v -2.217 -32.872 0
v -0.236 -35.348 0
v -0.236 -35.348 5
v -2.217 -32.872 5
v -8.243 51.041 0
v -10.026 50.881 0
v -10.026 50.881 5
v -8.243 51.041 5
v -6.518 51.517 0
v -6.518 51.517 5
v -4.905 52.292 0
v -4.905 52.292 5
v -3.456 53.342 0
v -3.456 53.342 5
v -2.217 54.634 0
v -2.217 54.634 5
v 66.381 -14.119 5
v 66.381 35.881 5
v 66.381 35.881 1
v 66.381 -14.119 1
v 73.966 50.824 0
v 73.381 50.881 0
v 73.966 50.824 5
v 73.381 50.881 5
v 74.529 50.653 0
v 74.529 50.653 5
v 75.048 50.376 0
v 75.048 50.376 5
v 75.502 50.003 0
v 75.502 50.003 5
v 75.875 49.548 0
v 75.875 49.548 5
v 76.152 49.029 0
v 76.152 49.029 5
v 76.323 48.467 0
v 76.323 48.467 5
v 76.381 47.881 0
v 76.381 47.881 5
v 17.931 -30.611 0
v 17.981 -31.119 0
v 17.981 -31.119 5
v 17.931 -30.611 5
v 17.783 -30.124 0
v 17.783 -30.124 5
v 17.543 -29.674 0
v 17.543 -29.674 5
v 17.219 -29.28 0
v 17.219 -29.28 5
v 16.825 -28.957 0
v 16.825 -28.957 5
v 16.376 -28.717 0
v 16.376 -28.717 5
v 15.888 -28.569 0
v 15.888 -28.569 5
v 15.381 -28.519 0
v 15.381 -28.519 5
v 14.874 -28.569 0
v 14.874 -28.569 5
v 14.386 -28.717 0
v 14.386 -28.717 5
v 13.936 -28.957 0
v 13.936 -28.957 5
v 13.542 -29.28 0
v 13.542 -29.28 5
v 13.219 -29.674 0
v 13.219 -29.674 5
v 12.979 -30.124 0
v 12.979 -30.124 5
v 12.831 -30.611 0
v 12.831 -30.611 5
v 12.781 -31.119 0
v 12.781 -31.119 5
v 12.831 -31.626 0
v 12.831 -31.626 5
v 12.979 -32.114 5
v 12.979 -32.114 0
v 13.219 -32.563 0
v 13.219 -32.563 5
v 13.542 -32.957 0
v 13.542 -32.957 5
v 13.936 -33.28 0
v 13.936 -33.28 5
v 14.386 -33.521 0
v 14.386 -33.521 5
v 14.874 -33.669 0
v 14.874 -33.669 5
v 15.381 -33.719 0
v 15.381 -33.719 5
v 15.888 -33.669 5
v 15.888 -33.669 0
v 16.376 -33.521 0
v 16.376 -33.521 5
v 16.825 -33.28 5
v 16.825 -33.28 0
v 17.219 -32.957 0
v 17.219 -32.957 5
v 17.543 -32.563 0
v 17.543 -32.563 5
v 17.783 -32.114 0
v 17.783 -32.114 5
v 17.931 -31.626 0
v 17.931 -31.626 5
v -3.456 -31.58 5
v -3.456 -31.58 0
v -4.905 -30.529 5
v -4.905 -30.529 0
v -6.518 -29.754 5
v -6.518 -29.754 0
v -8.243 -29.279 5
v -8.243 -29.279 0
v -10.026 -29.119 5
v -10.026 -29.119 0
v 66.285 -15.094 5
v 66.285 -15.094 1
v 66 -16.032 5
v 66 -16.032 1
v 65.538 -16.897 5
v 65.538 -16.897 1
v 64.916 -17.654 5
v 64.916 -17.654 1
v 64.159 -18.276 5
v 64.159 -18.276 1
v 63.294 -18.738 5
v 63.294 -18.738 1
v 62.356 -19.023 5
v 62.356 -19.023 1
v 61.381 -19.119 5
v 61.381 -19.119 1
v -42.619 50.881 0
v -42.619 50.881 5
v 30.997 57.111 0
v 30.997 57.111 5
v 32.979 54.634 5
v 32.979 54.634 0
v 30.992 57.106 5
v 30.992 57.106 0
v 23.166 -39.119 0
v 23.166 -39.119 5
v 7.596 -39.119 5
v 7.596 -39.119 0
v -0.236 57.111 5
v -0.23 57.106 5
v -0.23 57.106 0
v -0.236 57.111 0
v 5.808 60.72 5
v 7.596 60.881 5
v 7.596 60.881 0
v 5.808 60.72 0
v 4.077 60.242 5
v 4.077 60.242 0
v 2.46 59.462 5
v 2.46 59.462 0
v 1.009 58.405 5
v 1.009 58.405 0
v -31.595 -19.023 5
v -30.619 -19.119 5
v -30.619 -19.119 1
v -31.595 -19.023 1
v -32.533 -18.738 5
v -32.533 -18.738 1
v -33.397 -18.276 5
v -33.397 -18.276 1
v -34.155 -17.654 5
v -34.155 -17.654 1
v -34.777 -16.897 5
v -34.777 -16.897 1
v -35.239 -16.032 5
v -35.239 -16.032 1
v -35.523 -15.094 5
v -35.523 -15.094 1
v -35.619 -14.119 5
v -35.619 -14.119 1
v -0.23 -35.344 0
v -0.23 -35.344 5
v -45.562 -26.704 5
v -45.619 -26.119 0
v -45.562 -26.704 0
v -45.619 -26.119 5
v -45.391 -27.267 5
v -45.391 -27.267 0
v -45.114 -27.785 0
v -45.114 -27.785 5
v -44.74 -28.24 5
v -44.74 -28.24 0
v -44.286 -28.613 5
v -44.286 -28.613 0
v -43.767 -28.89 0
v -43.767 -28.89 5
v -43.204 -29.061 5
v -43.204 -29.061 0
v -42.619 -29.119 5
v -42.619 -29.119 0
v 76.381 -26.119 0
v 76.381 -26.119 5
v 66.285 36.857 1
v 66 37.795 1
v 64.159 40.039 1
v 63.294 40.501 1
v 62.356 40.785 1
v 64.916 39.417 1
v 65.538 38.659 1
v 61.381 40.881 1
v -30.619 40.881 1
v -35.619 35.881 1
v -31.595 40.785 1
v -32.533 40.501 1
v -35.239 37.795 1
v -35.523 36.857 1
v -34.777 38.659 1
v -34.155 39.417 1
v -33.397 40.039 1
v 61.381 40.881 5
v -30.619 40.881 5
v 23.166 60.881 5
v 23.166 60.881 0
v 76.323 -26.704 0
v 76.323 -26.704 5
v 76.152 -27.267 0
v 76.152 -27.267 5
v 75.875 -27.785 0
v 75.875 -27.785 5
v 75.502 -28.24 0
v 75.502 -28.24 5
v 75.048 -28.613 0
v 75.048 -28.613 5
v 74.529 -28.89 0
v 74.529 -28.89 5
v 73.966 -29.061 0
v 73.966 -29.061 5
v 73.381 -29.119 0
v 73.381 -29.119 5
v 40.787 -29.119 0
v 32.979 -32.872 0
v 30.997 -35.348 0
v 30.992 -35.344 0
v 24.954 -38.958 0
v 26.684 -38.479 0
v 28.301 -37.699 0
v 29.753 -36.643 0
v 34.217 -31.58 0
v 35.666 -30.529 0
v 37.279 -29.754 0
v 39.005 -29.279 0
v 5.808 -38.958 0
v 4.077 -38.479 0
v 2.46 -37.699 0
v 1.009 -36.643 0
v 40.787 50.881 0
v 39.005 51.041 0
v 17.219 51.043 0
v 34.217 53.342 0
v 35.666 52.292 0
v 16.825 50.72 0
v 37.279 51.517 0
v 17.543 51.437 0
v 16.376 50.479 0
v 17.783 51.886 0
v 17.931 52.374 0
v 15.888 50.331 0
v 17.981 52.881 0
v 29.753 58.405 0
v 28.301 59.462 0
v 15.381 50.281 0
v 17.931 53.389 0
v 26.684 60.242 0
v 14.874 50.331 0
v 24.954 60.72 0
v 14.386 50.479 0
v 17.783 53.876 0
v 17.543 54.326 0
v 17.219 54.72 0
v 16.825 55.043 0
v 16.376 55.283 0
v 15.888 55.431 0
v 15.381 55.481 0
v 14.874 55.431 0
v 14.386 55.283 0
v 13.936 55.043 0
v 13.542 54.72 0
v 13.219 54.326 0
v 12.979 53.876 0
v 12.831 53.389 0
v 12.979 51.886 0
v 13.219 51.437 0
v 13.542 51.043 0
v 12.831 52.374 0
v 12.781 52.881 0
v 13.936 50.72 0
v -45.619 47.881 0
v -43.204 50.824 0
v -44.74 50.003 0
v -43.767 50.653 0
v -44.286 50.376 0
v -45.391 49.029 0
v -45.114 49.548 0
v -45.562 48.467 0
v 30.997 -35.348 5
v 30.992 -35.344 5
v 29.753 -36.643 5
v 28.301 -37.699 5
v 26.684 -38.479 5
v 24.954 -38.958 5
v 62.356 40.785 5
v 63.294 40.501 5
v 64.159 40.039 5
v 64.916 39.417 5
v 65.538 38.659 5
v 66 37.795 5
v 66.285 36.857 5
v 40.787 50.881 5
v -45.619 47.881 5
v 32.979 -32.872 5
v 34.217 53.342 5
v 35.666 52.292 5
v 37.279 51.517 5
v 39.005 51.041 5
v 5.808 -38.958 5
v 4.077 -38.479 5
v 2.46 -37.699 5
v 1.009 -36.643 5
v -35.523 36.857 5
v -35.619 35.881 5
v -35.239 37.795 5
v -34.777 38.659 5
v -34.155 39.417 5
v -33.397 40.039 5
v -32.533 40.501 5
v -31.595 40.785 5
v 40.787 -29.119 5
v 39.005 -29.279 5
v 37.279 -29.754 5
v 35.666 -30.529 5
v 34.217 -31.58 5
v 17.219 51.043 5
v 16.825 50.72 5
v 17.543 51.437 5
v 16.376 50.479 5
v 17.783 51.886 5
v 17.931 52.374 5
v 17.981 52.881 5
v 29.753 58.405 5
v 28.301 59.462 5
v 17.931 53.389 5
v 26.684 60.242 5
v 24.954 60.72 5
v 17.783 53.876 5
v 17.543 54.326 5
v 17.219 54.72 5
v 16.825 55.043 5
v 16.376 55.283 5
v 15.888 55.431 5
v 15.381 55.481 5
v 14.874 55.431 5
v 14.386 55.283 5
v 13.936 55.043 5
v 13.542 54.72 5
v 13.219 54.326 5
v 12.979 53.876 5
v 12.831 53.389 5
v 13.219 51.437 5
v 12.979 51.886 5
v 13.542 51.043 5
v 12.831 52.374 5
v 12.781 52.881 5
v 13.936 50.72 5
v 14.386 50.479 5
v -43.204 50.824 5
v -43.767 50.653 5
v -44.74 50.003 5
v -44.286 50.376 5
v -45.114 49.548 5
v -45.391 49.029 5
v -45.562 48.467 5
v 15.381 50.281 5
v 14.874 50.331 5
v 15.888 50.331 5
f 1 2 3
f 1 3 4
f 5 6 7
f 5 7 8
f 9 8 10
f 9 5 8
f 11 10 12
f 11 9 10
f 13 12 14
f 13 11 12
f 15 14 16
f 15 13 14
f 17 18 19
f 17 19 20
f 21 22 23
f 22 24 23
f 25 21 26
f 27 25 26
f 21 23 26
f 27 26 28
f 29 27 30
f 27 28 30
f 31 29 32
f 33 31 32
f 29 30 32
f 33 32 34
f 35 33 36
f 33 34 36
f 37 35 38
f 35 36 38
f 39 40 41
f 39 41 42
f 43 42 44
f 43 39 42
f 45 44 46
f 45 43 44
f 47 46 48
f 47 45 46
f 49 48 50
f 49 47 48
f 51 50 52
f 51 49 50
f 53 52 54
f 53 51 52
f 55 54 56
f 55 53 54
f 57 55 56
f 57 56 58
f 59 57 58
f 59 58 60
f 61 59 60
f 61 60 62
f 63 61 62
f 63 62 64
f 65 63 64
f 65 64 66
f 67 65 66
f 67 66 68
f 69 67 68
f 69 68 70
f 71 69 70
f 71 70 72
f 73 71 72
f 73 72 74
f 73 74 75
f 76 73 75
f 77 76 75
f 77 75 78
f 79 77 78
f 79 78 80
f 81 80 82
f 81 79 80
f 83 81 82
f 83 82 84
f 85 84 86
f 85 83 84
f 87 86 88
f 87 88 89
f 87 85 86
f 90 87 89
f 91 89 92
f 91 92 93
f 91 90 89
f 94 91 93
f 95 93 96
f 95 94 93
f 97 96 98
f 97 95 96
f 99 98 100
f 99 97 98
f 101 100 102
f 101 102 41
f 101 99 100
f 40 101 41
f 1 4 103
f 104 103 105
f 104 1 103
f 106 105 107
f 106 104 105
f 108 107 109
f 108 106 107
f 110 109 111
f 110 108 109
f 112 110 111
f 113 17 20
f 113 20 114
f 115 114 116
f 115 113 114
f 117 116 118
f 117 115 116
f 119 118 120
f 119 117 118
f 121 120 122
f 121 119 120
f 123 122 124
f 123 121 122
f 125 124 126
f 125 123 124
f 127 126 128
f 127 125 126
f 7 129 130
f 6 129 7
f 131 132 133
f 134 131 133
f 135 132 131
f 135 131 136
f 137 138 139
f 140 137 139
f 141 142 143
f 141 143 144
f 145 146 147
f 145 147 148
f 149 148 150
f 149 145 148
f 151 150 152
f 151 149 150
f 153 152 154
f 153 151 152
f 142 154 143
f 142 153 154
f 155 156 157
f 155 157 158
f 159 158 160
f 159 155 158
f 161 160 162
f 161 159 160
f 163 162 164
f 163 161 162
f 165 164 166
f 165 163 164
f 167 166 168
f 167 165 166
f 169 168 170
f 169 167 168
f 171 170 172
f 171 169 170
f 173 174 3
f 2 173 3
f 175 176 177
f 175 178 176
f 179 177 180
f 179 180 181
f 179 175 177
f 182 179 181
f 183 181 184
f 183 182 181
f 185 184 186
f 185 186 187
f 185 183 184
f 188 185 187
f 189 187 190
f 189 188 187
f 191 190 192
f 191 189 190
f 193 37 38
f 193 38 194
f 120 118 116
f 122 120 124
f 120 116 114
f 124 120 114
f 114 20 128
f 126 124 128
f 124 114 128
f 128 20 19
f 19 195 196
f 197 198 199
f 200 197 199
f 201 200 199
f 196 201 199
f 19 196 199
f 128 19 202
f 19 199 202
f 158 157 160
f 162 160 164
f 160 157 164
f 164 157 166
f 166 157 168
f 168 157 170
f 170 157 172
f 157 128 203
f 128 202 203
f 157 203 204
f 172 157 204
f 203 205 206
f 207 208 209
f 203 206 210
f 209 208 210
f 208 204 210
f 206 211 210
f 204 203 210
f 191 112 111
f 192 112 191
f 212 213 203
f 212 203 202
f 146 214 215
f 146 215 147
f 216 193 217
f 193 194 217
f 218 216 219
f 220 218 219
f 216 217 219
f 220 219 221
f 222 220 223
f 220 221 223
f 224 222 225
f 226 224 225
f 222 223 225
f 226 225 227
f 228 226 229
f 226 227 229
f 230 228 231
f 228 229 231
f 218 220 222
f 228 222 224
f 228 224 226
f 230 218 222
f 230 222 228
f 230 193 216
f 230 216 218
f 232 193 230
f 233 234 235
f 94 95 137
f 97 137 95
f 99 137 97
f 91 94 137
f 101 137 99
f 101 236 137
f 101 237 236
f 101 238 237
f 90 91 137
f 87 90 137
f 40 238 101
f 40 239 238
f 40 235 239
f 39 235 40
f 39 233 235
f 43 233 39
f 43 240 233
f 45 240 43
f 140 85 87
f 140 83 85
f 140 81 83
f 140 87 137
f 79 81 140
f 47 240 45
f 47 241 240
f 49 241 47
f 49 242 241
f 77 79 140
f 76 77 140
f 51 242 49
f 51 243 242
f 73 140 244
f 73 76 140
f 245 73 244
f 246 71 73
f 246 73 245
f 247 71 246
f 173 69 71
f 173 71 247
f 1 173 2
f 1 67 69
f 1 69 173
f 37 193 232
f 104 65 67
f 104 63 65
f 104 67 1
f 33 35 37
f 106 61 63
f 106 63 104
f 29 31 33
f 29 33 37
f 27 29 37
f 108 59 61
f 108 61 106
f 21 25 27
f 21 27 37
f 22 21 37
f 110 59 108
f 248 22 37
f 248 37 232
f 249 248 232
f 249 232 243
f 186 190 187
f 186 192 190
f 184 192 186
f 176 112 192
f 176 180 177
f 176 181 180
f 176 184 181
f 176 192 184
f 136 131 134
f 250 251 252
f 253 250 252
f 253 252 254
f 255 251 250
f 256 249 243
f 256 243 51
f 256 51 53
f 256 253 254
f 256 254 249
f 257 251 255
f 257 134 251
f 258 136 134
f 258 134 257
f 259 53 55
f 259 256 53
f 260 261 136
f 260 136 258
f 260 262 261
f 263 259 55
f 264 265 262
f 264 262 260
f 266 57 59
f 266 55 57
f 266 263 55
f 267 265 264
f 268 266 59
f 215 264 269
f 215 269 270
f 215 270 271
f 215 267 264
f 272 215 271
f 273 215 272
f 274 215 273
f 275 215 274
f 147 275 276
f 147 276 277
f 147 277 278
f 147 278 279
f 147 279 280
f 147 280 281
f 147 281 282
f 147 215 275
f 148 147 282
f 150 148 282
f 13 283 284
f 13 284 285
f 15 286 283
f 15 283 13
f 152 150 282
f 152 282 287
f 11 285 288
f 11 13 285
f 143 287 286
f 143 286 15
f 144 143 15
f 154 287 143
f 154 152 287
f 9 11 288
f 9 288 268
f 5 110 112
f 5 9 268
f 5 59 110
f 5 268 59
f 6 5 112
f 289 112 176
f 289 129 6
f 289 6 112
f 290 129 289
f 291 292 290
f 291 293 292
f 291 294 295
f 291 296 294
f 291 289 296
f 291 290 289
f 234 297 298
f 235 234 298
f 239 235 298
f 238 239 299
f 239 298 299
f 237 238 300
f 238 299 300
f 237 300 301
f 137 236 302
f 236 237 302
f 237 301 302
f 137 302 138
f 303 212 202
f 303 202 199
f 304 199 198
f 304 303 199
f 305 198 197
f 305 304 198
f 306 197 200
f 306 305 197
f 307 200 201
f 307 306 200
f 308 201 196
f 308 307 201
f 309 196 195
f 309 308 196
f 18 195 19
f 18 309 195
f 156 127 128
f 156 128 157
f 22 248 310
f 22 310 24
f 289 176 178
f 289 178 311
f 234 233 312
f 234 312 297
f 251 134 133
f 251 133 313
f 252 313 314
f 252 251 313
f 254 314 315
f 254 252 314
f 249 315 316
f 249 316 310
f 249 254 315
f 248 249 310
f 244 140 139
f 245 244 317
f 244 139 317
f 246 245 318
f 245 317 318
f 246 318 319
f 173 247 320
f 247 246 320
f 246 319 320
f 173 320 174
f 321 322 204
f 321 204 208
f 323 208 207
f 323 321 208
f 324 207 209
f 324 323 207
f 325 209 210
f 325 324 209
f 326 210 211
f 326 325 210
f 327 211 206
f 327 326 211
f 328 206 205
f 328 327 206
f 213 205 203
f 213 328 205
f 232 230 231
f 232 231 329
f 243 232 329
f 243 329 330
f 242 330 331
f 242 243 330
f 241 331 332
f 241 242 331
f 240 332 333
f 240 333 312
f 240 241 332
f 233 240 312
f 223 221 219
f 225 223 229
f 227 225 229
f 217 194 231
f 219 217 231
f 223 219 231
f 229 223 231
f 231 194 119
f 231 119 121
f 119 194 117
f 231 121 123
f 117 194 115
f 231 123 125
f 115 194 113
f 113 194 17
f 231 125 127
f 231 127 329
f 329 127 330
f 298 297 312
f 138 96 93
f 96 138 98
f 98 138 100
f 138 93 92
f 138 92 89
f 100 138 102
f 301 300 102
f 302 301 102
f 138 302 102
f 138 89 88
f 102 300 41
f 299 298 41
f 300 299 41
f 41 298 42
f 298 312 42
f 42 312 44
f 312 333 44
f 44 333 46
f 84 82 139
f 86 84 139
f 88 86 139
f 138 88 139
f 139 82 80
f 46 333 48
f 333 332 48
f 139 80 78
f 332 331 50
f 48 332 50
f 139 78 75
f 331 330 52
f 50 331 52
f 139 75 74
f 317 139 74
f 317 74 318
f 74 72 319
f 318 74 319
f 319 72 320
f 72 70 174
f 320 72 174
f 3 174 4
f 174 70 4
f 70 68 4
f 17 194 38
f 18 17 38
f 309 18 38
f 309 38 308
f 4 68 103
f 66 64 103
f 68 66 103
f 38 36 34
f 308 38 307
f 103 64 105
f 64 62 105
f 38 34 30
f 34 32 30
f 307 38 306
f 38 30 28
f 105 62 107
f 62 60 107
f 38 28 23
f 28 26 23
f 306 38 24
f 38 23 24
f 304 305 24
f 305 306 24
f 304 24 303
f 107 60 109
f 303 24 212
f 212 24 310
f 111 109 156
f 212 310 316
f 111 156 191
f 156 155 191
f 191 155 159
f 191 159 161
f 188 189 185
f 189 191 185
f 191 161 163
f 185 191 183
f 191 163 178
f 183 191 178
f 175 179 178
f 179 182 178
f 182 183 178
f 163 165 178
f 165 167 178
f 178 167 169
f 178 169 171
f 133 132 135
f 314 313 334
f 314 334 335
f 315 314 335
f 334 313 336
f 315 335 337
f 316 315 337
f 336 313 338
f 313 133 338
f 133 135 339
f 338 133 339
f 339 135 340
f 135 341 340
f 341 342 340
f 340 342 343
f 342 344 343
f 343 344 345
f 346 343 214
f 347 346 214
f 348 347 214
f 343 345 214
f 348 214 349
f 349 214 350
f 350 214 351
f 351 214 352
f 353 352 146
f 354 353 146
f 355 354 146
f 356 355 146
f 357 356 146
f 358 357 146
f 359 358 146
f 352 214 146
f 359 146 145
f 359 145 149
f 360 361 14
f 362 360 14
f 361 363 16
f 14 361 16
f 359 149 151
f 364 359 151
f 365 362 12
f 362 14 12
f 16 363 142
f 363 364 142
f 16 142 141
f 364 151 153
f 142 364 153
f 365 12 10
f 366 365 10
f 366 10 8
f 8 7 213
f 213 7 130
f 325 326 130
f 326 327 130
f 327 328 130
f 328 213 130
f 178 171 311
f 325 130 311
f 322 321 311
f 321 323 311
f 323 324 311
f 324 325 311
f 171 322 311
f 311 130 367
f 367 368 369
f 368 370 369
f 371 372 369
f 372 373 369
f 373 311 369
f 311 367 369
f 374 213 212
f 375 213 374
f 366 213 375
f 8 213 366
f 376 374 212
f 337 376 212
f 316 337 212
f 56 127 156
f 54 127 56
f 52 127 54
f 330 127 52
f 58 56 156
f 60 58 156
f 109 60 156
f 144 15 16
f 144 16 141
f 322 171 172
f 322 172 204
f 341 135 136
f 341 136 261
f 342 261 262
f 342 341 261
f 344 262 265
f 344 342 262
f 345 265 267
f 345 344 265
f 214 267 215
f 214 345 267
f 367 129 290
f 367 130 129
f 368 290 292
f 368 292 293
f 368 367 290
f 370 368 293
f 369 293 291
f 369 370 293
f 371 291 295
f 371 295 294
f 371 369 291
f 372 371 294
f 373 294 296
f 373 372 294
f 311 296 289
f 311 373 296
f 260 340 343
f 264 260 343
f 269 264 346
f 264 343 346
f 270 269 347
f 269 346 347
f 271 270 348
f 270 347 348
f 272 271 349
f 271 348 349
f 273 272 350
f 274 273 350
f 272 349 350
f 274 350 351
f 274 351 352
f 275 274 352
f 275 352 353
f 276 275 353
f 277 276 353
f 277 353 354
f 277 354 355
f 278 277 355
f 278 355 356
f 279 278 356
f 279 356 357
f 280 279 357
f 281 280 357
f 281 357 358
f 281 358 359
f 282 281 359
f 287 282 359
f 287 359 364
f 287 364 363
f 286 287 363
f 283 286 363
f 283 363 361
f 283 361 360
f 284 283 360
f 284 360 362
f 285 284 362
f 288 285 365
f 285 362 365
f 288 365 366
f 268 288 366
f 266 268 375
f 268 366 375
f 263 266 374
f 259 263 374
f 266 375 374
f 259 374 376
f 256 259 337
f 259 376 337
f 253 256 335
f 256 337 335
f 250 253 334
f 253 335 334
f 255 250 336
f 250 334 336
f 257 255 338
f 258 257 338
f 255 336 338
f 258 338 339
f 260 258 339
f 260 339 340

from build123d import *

# Parameters (mm, degrees)
BOSS_EXTRUDE1_DEPTH = 5
CUT_EXTRUDE1_START  = -10
SKETCH3_R           = 2.6
CUT_EXTRUDE1_DEPTH  = 10
FILLET1_R           = 10
FILLET2_R           = 3
SKETCH4_R           = 2.6
CUT_EXTRUDE2_DEPTH  = 10
CUT_EXTRUDE3_DEPTH  = 4
CUT_EXTRUDE4_DEPTH  = 10


with BuildPart() as part:
    # Sketch1 → Boss-Extrude1 (new body)
    with BuildSketch(Plane.XY):
        with BuildLine():
            Line((-42.619167718, 65.881324086), (73.380832282, 65.881324086))
            ThreePointArc((73.380832282, 65.881324086), (75.502152626, 65.002644429), (76.380832282, 62.881324086))
            Line((76.380832282, 62.881324086), (76.380832282, -41.118675914))
            ThreePointArc((76.380832282, -41.118675914), (75.502152626, -43.239996258), (73.380832282, -44.118675914))
            Line((73.380832282, -44.118675914), (-42.619167718, -44.118675914))
            ThreePointArc((-42.619167718, -44.118675914), (-44.740488061, -43.239996258), (-45.619167718, -41.118675914))
            Line((-45.619167718, -41.118675914), (-45.619167718, 62.881324086))
            ThreePointArc((-45.619167718, 62.881324086), (-44.740488061, 65.002644429), (-42.619167718, 65.881324086))
        make_face()
    extrude(amount=BOSS_EXTRUDE1_DEPTH)

    # Sketch3 → Cut-Extrude1 (cut)
    with BuildSketch(Plane.XY.offset(5).offset(CUT_EXTRUDE1_START)):
        with BuildLine():
            Line((-42.619167718, 65.881324086), (6.780832282, 65.881324086))
            Line((6.780832282, 65.881324086), (6.780832282, 81.136513461))
            Line((6.780832282, 81.136513461), (-45.619167718, 81.136513461))
            Line((-45.619167718, 81.136513461), (-45.619167718, 62.881324086))
            ThreePointArc((-45.619167718, 62.881324086), (-44.740488061, 65.002644429), (-42.619167718, 65.881324086))
        make_face()
        with BuildLine():
            Line((-2.217047099, 54.63427273), (6.780832282, 65.881324086))
            Line((6.780832282, 65.881324086), (-42.619167718, 65.881324086))
            ThreePointArc((-42.619167718, 65.881324086), (-44.740488061, 65.002644429), (-45.619167718, 62.881324086))
            Line((-45.619167718, 62.881324086), (-45.619167718, 50.881324086))
            Line((-45.619167718, 50.881324086), (-10.025654488, 50.881324086))
            ThreePointArc((-10.025654488, 50.881324086), (-5.693825403, 51.868263741), (-2.217047099, 54.63427273))
        make_face()
        with BuildLine():
            ThreePointArc((73.380832282, 65.881324086), (75.502152626, 65.002644429), (76.380832282, 62.881324086))
            Line((76.380832282, 62.881324086), (76.380832282, 81.136513461))
            Line((76.380832282, 81.136513461), (23.980832282, 81.136513461))
            Line((23.980832282, 81.136513461), (23.980832282, 65.881324086))
            Line((23.980832282, 65.881324086), (73.380832282, 65.881324086))
        make_face()
        with BuildLine():
            ThreePointArc((32.978711664, 54.63427273), (36.455489968, 51.868263741), (40.787319053, 50.881324086))
            Line((40.787319053, 50.881324086), (76.380832282, 50.881324086))
            Line((76.380832282, 50.881324086), (76.380832282, 62.881324086))
            ThreePointArc((76.380832282, 62.881324086), (75.502152626, 65.002644429), (73.380832282, 65.881324086))
            Line((73.380832282, 65.881324086), (23.980832282, 65.881324086))
            Line((23.980832282, 65.881324086), (32.978711664, 54.63427273))
        make_face()
        with BuildLine():
            Line((76.380832282, -41.118675914), (76.380832282, -29.118675914))
            Line((76.380832282, -29.118675914), (40.787319053, -29.118675914))
            ThreePointArc((40.787319053, -29.118675914), (36.455489968, -30.105615569), (32.978711664, -32.871624558))
            Line((32.978711664, -32.871624558), (23.980832282, -44.118675914))
            Line((23.980832282, -44.118675914), (73.380832282, -44.118675914))
            ThreePointArc((73.380832282, -44.118675914), (75.502152626, -43.239996258), (76.380832282, -41.118675914))
        make_face()
        with BuildLine():
            Line((76.380832282, -59.373865289), (76.380832282, -41.118675914))
            ThreePointArc((76.380832282, -41.118675914), (75.502152626, -43.239996258), (73.380832282, -44.118675914))
            Line((73.380832282, -44.118675914), (23.980832282, -44.118675914))
            Line((23.980832282, -44.118675914), (23.980832282, -59.373865289))
            Line((23.980832282, -59.373865289), (76.380832282, -59.373865289))
        make_face()
        with BuildLine():
            Line((-42.619167718, -44.118675914), (6.780832282, -44.118675914))
            Line((6.780832282, -44.118675914), (-2.217047099, -32.871624558))
            ThreePointArc((-2.217047099, -32.871624558), (-5.693825403, -30.105615569), (-10.025654488, -29.118675914))
            Line((-10.025654488, -29.118675914), (-45.619167718, -29.118675914))
            Line((-45.619167718, -29.118675914), (-45.619167718, -41.118675914))
            ThreePointArc((-45.619167718, -41.118675914), (-44.740488061, -43.239996258), (-42.619167718, -44.118675914))
        make_face()
        with BuildLine():
            Line((6.780832282, -59.373865289), (6.780832282, -44.118675914))
            Line((6.780832282, -44.118675914), (-42.619167718, -44.118675914))
            ThreePointArc((-42.619167718, -44.118675914), (-44.740488061, -43.239996258), (-45.619167718, -41.118675914))
            Line((-45.619167718, -41.118675914), (-45.619167718, -59.373865289))
            Line((-45.619167718, -59.373865289), (6.780832282, -59.373865289))
        make_face()
        with Locations((15.380832282, -31.118675914)):
            Circle(SKETCH3_R)
    extrude(amount=CUT_EXTRUDE1_DEPTH, mode=Mode.SUBTRACT)

    # Fillet1
    fillet1_edges = [part.edges().sort_by_distance(p)[0] for p in [
        (6.780832282, 65.881324086, 2.5),
        (23.980832282, 65.881324086, 2.5),
        (23.980832282, -44.118675914, 2.5),
        (6.780832282, -44.118675914, 2.5),
    ]]
    fillet(fillet1_edges, radius=FILLET1_R)

    # Fillet2
    fillet2_edges = [part.edges().sort_by_distance(p)[0] for p in [
        (-45.619167718, -29.118675914, 2.5),
        (-45.619167718, 50.881324086, 2.5),
        (76.380832282, 50.881324086, 2.5),
        (76.380832282, -29.118675914, 2.5),
    ]]
    fillet(fillet2_edges, radius=FILLET2_R)

    # Sketch4 → Cut-Extrude2 (cut)
    with BuildSketch(Plane.XY.offset(5)):
        with Locations((15.380832282, 52.881324086)):
            Circle(SKETCH4_R)
    extrude(amount=-CUT_EXTRUDE2_DEPTH, mode=Mode.SUBTRACT)

    # Sketch5 → Cut-Extrude3 (cut)
    with BuildSketch(Plane.XY.offset(5)):
        with BuildLine():
            Line((-30.619167718, 40.881324086), (61.380832282, 40.881324086))
            ThreePointArc((61.380832282, 40.881324086), (64.916366188, 39.416857992), (66.380832282, 35.881324086))
            Line((66.380832282, 35.881324086), (66.380832282, -14.118675914))
            ThreePointArc((66.380832282, -14.118675914), (64.916366188, -17.65420982), (61.380832282, -19.118675914))
            Line((61.380832282, -19.118675914), (-30.619167718, -19.118675914))
            ThreePointArc((-30.619167718, -19.118675914), (-34.154701623, -17.65420982), (-35.619167718, -14.118675914))
            Line((-35.619167718, -14.118675914), (-35.619167718, 35.881324086))
            ThreePointArc((-35.619167718, 35.881324086), (-34.154701623, 39.416857992), (-30.619167718, 40.881324086))
        make_face()
    extrude(amount=-CUT_EXTRUDE3_DEPTH, mode=Mode.SUBTRACT)

    # Sketch6 → Cut-Extrude4 (cut)
    with BuildSketch(Plane.XY.offset(5)):
        with BuildLine():
            Line((23.165898511, 60.881324086), (7.595766054, 60.881324086))
            ThreePointArc((7.595766054, 60.881324086), (3.25131348, 59.888306479), (-0.230315515, 57.106470452))
            Line((-0.230315515, 57.106470452), (-2.058004159, 58.560279644))
            Line((-2.058004159, 58.560279644), (6.679710473, 70.400464375))
            Line((6.679710473, 70.400464375), (28.478804217, 70.400464375))
            Line((28.478804217, 70.400464375), (32.819668724, 58.560279644))
            Line((32.819668724, 58.560279644), (30.99198008, 57.106470452))
            ThreePointArc((30.99198008, 57.106470452), (27.510351085, 59.888306479), (23.165898511, 60.881324086))
        make_face()
        with BuildLine():
            Line((28.478804217, -48.637816204), (32.819668724, -36.797631473))
            Line((32.819668724, -36.797631473), (30.99198008, -35.343822281))
            ThreePointArc((30.99198008, -35.343822281), (27.510351085, -38.125658307), (23.165898511, -39.118675914))
            Line((23.165898511, -39.118675914), (7.595766054, -39.118675914))
            ThreePointArc((7.595766054, -39.118675914), (3.25131348, -38.125658307), (-0.230315515, -35.343822281))
            Line((-0.230315515, -35.343822281), (-2.058004159, -36.797631473))
            Line((-2.058004159, -36.797631473), (6.679710473, -48.637816204))
            Line((6.679710473, -48.637816204), (28.478804217, -48.637816204))
        make_face()
    extrude(amount=-CUT_EXTRUDE4_DEPTH, mode=Mode.SUBTRACT)


solid = part.part
